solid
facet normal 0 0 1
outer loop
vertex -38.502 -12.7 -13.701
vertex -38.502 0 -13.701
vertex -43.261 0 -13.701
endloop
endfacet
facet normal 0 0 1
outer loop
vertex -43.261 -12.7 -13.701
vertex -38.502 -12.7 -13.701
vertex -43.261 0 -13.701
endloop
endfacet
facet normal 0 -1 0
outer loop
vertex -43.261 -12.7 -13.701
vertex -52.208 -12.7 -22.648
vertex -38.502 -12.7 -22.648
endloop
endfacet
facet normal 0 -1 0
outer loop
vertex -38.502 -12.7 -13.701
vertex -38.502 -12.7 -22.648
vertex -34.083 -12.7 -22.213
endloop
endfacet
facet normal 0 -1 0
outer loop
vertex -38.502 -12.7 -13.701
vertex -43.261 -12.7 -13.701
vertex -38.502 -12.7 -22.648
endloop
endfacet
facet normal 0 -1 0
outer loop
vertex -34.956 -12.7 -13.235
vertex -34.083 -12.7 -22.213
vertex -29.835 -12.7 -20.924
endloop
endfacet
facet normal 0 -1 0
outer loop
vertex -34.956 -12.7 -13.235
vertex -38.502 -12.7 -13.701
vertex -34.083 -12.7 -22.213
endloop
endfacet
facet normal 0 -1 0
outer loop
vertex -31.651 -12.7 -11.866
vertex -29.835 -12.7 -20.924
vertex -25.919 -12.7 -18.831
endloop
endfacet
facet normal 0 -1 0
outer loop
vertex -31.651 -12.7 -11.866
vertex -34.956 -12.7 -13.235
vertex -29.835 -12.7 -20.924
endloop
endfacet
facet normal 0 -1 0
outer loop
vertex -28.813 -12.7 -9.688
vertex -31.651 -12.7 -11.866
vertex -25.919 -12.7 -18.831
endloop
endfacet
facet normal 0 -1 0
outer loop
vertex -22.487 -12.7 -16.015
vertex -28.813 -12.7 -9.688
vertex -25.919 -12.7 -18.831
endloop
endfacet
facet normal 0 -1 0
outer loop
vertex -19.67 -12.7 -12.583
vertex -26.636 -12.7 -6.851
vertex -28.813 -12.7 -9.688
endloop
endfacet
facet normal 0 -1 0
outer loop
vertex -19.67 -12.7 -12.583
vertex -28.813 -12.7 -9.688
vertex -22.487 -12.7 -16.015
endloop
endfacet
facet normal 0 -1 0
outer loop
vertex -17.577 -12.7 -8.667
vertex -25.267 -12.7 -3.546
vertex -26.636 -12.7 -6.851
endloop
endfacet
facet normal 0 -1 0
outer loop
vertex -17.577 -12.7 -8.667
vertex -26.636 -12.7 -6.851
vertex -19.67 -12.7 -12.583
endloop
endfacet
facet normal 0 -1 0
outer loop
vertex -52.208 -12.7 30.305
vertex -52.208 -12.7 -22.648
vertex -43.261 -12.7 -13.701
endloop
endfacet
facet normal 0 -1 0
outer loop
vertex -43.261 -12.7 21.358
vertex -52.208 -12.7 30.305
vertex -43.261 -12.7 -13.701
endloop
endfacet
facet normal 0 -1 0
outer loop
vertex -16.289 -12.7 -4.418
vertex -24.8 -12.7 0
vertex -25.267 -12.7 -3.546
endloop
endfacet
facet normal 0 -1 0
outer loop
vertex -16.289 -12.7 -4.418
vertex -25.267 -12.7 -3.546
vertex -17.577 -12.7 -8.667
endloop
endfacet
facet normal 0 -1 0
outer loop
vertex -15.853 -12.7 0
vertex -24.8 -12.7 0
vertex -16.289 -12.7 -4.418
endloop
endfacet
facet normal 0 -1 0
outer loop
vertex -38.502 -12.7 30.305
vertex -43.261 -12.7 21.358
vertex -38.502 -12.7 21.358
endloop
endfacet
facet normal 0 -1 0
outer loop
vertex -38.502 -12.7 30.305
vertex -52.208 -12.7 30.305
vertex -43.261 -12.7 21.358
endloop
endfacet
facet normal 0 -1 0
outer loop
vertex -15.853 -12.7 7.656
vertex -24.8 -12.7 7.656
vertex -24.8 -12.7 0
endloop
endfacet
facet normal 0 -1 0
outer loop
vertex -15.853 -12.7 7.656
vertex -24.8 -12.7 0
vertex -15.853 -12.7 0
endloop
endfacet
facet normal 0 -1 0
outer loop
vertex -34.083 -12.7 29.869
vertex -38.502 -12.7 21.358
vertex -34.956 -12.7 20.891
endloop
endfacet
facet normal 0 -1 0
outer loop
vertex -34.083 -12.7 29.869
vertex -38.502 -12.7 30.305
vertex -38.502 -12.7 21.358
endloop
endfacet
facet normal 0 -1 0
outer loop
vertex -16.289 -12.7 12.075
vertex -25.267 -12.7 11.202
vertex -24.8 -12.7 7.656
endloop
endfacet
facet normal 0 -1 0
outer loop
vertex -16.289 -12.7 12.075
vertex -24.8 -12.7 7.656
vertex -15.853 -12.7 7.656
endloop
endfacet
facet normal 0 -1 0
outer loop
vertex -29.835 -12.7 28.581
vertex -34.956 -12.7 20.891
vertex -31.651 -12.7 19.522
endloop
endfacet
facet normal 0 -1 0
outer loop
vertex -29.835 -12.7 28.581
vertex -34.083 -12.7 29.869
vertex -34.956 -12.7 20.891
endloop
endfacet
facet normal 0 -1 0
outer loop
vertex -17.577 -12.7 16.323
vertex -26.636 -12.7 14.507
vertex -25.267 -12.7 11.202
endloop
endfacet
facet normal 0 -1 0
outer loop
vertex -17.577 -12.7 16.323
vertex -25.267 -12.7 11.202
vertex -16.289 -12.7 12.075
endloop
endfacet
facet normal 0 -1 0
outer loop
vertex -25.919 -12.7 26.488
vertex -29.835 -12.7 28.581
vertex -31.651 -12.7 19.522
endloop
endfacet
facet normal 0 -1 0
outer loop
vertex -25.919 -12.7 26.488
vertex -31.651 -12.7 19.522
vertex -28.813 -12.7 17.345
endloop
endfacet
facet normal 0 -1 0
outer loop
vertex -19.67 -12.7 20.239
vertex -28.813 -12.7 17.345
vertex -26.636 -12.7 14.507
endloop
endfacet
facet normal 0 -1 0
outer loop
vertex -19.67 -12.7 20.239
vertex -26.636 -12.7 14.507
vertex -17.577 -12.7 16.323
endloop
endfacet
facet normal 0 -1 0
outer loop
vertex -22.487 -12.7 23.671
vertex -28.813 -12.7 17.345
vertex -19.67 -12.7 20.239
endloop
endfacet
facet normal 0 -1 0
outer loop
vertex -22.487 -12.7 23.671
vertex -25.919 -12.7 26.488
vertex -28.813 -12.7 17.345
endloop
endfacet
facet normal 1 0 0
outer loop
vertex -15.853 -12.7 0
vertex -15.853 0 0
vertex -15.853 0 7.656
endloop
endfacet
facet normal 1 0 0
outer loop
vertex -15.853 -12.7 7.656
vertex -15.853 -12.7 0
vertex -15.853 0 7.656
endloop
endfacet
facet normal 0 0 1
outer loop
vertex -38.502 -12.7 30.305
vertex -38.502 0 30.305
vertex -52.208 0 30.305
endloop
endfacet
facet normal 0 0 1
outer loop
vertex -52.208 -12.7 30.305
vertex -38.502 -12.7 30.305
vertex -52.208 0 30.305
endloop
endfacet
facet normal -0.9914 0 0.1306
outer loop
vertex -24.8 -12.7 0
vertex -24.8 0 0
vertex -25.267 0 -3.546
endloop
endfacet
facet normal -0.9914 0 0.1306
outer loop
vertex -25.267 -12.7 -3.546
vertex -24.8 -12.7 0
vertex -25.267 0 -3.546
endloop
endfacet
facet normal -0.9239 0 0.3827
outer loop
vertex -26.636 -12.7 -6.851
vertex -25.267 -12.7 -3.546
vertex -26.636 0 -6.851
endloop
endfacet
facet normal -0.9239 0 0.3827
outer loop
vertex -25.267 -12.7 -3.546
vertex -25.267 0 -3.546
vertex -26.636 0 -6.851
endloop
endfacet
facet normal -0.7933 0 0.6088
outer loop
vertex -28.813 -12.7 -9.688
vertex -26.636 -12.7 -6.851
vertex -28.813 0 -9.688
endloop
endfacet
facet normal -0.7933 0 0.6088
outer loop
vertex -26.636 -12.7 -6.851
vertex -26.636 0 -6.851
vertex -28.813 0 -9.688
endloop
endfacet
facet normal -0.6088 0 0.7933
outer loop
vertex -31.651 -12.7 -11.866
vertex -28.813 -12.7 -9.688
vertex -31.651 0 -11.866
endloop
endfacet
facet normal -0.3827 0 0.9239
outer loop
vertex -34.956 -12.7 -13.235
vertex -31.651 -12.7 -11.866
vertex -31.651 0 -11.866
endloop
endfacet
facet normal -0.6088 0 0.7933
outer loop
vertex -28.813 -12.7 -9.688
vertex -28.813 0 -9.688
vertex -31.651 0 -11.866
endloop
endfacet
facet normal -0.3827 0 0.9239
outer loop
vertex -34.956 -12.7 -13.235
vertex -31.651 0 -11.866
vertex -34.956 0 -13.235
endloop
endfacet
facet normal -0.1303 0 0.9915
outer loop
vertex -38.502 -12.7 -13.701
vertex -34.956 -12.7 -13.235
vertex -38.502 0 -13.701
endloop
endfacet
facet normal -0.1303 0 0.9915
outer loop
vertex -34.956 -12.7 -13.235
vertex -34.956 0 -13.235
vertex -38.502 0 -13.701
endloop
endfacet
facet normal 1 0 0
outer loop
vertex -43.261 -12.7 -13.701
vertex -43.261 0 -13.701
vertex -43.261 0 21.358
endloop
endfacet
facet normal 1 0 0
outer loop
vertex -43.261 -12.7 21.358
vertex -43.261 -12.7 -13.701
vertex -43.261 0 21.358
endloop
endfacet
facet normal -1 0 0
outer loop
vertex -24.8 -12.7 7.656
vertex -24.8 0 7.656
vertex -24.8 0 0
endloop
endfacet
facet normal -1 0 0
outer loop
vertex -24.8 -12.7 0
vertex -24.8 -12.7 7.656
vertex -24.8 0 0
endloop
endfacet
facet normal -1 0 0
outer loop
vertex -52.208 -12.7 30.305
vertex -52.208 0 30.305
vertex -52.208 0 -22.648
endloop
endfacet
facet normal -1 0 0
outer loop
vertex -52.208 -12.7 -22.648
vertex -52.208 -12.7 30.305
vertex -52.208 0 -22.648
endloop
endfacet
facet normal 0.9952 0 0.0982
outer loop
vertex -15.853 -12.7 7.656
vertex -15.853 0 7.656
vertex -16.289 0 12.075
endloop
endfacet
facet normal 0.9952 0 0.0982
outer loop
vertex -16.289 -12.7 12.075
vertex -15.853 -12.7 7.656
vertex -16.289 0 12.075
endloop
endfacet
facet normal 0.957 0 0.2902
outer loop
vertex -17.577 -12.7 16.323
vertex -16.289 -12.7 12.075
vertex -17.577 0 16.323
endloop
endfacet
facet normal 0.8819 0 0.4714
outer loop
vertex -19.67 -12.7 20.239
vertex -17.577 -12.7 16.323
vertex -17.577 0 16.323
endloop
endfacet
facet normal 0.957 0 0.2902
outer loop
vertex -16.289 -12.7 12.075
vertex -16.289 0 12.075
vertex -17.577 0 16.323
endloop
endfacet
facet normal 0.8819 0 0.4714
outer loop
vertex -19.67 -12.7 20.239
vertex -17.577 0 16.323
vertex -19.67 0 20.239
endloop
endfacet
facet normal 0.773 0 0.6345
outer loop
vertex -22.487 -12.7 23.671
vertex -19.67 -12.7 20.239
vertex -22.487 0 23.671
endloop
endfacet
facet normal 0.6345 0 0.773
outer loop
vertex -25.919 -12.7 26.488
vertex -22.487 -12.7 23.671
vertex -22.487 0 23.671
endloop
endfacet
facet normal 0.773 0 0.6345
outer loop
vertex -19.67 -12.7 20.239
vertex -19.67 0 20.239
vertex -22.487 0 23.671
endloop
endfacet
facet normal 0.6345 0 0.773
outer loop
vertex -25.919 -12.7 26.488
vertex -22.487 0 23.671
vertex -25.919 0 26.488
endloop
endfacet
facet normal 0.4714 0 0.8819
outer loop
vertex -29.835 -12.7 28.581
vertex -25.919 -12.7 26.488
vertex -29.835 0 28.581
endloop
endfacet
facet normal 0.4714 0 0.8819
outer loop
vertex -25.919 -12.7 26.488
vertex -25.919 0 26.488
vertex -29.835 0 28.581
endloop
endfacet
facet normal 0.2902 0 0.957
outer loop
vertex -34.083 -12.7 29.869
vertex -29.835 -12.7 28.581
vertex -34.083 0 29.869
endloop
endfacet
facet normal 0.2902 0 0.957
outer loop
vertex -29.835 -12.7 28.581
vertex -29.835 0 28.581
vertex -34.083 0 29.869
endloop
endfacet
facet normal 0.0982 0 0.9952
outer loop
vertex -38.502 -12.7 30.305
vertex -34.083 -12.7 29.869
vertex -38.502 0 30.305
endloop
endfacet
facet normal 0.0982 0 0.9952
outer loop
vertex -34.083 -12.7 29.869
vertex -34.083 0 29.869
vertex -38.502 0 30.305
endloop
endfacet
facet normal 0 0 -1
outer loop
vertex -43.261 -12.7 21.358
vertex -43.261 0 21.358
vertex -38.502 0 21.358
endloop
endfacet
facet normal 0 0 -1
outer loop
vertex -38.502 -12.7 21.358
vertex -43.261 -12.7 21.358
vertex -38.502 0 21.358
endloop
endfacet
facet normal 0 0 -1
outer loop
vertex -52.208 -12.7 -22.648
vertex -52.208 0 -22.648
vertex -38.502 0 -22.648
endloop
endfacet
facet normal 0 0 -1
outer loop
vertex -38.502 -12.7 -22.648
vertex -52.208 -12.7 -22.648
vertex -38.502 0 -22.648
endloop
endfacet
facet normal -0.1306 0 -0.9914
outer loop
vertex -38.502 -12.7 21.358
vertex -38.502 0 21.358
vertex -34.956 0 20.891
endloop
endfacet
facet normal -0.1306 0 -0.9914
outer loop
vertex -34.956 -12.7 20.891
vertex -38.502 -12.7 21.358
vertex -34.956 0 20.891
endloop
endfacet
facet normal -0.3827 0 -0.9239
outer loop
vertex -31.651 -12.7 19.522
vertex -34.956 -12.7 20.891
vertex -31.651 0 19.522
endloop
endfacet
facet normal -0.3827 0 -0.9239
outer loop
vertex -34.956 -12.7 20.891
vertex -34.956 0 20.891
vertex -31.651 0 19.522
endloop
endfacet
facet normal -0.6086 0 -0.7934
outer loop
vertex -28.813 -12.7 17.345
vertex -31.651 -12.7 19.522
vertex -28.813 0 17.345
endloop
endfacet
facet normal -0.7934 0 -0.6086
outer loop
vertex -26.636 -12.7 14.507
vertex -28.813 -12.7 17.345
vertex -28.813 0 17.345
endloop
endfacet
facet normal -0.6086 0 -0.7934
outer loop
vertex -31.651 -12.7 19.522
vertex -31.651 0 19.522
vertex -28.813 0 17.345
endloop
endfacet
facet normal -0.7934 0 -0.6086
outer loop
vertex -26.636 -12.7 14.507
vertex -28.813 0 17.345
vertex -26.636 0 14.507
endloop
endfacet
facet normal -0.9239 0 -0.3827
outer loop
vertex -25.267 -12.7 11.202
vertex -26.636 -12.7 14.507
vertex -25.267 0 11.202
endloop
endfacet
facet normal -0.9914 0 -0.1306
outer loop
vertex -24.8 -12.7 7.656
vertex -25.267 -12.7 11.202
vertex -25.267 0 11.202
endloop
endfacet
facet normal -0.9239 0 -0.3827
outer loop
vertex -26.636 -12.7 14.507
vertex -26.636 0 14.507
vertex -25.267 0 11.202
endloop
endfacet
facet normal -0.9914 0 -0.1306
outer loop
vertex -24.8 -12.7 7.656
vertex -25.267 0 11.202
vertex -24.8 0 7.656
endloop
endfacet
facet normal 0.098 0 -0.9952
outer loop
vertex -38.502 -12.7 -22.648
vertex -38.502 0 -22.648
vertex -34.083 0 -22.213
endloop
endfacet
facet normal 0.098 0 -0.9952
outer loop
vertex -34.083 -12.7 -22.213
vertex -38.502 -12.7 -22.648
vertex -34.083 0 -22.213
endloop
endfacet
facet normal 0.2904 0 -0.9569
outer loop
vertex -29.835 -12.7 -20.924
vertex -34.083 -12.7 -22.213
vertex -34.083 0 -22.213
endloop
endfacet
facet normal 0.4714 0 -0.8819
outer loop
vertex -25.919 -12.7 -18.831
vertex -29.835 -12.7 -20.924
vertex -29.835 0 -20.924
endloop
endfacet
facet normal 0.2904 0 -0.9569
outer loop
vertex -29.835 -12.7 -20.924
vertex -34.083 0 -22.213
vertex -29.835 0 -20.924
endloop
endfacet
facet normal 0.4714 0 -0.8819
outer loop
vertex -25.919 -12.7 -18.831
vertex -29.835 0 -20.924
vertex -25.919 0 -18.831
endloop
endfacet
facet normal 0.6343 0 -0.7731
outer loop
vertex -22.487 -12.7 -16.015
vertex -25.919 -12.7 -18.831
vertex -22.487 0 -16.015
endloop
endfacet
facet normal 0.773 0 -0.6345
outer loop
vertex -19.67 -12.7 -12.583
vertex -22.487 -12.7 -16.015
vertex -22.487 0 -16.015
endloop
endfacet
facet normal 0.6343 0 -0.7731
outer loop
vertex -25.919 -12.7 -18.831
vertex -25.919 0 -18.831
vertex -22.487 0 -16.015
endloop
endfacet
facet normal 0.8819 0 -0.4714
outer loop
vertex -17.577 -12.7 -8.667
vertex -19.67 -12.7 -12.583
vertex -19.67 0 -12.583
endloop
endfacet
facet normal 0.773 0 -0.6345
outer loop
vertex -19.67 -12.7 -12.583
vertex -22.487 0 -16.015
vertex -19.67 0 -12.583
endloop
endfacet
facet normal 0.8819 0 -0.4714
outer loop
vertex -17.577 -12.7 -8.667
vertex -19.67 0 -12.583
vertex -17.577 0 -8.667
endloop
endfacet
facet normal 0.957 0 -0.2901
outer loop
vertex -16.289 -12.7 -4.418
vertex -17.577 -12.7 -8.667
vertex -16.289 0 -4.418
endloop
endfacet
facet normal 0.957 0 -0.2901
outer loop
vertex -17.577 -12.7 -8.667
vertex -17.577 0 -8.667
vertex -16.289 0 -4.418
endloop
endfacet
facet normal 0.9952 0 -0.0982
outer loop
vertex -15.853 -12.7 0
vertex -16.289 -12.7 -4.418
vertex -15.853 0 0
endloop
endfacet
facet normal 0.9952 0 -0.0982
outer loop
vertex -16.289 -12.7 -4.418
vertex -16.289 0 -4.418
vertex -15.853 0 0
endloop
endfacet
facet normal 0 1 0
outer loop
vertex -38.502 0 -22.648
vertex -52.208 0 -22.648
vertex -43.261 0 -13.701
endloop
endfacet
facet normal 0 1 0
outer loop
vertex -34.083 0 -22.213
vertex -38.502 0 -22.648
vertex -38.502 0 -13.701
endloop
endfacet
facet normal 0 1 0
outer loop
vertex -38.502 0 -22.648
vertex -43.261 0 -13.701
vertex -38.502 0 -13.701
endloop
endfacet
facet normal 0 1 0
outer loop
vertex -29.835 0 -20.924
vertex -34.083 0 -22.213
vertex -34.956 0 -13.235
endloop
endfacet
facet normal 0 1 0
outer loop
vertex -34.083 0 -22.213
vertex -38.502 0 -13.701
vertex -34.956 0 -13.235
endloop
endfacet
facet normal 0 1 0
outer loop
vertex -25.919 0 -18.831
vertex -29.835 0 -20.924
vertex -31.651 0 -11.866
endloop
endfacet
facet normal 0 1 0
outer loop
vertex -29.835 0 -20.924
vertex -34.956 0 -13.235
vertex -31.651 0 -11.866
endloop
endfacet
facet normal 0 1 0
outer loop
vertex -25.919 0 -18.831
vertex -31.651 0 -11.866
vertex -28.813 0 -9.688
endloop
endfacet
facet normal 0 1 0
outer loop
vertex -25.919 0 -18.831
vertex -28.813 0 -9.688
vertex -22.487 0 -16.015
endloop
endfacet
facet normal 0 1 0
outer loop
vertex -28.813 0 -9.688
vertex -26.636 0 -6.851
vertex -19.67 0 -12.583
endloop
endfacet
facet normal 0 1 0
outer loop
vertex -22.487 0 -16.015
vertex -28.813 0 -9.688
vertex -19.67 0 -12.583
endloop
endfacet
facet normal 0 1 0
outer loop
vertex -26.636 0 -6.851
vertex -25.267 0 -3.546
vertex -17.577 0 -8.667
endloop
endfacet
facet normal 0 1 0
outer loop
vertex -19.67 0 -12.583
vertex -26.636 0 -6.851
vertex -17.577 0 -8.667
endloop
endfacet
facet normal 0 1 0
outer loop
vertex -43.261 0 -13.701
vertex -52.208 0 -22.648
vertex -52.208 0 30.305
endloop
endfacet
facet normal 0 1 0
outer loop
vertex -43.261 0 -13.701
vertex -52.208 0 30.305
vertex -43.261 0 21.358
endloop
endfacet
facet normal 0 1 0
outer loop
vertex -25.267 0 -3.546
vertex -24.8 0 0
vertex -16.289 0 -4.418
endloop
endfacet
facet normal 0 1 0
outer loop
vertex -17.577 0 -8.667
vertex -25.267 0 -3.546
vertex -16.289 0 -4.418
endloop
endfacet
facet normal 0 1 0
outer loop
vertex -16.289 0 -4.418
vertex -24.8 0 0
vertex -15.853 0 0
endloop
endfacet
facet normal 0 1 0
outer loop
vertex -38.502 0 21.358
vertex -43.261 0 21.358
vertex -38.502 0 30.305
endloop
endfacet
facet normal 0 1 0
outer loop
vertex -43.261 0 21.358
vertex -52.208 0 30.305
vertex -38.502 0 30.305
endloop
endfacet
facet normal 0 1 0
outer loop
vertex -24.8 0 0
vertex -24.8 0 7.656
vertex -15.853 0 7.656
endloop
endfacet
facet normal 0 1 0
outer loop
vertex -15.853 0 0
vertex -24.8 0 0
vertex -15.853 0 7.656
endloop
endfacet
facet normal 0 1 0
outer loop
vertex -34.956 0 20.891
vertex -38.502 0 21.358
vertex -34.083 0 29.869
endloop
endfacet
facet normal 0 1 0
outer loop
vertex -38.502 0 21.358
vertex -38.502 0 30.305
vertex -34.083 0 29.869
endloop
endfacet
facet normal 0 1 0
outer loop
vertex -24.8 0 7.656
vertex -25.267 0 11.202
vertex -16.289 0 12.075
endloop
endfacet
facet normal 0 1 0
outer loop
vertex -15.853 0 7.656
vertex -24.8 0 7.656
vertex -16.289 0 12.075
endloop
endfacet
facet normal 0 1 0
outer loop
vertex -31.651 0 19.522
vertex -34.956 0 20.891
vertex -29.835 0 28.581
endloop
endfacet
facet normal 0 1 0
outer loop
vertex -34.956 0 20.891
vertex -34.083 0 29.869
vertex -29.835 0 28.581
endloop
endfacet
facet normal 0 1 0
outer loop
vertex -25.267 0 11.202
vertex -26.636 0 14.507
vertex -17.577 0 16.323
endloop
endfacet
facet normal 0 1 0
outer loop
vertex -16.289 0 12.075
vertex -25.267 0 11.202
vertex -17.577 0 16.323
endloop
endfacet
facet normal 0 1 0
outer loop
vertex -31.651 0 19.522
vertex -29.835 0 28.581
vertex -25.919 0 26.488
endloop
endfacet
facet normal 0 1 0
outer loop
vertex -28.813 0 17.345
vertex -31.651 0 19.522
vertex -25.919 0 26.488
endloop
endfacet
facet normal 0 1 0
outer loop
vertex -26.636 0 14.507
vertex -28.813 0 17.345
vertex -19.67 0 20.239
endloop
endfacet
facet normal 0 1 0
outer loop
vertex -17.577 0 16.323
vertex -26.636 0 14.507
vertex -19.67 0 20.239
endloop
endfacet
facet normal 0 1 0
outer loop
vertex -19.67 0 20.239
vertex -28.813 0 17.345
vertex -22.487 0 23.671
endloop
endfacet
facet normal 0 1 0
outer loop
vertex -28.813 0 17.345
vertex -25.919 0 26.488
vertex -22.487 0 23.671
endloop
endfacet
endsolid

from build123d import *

# Parameters (mm, degrees)
F1_DEPTH = 12.7
F2_DEPTH = 12.7


with BuildPart() as f1:
    # F0 (on Front) → F1 (new body)
    with BuildSketch(Plane.XZ):
        with BuildLine():
            Line((-43.261304, 3.828095), (-52.208334, 3.828095))
            Line((-52.208334, 3.828095), (-52.208334, -22.648397))
            Line((-52.208334, -22.648397), (-38.501772, -22.648397))
            ThreePointArc((-38.501772, -22.648397), (-22.486937, -16.014835), (-15.853375, 0))
            Line((-15.853375, 0), (-15.853375, 3.828095))
            Line((-15.853375, 3.828095), (-24.800405, 3.828095))
            Line((-24.800405, 3.828095), (-24.800405, 0))
            ThreePointArc((-24.800405, 0), (-28.813443, -9.68833), (-38.501772, -13.701367))
            Line((-38.501772, -13.701367), (-43.261304, -13.701367))
            Line((-43.261304, -13.701367), (-43.261304, 3.828095))
        make_face()
    extrude(amount=F1_DEPTH)

    # F0 (on Front) → F2 (join)
    with BuildSketch(Plane.XZ):
        with BuildLine():
            Line((-38.501772, 30.304587), (-52.208334, 30.304587))
            Line((-52.208334, 30.304587), (-52.208334, 3.828095))
            Line((-52.208334, 3.828095), (-43.261304, 3.828095))
            Line((-43.261304, 3.828095), (-43.261304, 21.357557))
            Line((-43.261304, 21.357557), (-38.501772, 21.357557))
            ThreePointArc((-38.501772, 21.357557), (-28.813443, 17.34452), (-24.800405, 7.65619))
            Line((-24.800405, 7.65619), (-24.800405, 3.828095))
            Line((-24.800405, 3.828095), (-15.853375, 3.828095))
            Line((-15.853375, 3.828095), (-15.853375, 7.65619))
            ThreePointArc((-15.853375, 7.65619), (-22.486937, 23.671025), (-38.501772, 30.304587))
        make_face()
        with BuildLine():
            Line((-43.261304, 3.828095), (-52.208334, 3.828095))
            Line((-52.208334, 3.828095), (-52.208334, -22.648397))
            Line((-52.208334, -22.648397), (-38.501772, -22.648397))
            ThreePointArc((-38.501772, -22.648397), (-22.486937, -16.014835), (-15.853375, 0))
            Line((-15.853375, 0), (-15.853375, 3.828095))
            Line((-15.853375, 3.828095), (-24.800405, 3.828095))
            Line((-24.800405, 3.828095), (-24.800405, 0))
            ThreePointArc((-24.800405, 0), (-28.813443, -9.68833), (-38.501772, -13.701367))
            Line((-38.501772, -13.701367), (-43.261304, -13.701367))
            Line((-43.261304, -13.701367), (-43.261304, 3.828095))
        make_face()
    extrude(amount=F2_DEPTH)


solid = f1.part
